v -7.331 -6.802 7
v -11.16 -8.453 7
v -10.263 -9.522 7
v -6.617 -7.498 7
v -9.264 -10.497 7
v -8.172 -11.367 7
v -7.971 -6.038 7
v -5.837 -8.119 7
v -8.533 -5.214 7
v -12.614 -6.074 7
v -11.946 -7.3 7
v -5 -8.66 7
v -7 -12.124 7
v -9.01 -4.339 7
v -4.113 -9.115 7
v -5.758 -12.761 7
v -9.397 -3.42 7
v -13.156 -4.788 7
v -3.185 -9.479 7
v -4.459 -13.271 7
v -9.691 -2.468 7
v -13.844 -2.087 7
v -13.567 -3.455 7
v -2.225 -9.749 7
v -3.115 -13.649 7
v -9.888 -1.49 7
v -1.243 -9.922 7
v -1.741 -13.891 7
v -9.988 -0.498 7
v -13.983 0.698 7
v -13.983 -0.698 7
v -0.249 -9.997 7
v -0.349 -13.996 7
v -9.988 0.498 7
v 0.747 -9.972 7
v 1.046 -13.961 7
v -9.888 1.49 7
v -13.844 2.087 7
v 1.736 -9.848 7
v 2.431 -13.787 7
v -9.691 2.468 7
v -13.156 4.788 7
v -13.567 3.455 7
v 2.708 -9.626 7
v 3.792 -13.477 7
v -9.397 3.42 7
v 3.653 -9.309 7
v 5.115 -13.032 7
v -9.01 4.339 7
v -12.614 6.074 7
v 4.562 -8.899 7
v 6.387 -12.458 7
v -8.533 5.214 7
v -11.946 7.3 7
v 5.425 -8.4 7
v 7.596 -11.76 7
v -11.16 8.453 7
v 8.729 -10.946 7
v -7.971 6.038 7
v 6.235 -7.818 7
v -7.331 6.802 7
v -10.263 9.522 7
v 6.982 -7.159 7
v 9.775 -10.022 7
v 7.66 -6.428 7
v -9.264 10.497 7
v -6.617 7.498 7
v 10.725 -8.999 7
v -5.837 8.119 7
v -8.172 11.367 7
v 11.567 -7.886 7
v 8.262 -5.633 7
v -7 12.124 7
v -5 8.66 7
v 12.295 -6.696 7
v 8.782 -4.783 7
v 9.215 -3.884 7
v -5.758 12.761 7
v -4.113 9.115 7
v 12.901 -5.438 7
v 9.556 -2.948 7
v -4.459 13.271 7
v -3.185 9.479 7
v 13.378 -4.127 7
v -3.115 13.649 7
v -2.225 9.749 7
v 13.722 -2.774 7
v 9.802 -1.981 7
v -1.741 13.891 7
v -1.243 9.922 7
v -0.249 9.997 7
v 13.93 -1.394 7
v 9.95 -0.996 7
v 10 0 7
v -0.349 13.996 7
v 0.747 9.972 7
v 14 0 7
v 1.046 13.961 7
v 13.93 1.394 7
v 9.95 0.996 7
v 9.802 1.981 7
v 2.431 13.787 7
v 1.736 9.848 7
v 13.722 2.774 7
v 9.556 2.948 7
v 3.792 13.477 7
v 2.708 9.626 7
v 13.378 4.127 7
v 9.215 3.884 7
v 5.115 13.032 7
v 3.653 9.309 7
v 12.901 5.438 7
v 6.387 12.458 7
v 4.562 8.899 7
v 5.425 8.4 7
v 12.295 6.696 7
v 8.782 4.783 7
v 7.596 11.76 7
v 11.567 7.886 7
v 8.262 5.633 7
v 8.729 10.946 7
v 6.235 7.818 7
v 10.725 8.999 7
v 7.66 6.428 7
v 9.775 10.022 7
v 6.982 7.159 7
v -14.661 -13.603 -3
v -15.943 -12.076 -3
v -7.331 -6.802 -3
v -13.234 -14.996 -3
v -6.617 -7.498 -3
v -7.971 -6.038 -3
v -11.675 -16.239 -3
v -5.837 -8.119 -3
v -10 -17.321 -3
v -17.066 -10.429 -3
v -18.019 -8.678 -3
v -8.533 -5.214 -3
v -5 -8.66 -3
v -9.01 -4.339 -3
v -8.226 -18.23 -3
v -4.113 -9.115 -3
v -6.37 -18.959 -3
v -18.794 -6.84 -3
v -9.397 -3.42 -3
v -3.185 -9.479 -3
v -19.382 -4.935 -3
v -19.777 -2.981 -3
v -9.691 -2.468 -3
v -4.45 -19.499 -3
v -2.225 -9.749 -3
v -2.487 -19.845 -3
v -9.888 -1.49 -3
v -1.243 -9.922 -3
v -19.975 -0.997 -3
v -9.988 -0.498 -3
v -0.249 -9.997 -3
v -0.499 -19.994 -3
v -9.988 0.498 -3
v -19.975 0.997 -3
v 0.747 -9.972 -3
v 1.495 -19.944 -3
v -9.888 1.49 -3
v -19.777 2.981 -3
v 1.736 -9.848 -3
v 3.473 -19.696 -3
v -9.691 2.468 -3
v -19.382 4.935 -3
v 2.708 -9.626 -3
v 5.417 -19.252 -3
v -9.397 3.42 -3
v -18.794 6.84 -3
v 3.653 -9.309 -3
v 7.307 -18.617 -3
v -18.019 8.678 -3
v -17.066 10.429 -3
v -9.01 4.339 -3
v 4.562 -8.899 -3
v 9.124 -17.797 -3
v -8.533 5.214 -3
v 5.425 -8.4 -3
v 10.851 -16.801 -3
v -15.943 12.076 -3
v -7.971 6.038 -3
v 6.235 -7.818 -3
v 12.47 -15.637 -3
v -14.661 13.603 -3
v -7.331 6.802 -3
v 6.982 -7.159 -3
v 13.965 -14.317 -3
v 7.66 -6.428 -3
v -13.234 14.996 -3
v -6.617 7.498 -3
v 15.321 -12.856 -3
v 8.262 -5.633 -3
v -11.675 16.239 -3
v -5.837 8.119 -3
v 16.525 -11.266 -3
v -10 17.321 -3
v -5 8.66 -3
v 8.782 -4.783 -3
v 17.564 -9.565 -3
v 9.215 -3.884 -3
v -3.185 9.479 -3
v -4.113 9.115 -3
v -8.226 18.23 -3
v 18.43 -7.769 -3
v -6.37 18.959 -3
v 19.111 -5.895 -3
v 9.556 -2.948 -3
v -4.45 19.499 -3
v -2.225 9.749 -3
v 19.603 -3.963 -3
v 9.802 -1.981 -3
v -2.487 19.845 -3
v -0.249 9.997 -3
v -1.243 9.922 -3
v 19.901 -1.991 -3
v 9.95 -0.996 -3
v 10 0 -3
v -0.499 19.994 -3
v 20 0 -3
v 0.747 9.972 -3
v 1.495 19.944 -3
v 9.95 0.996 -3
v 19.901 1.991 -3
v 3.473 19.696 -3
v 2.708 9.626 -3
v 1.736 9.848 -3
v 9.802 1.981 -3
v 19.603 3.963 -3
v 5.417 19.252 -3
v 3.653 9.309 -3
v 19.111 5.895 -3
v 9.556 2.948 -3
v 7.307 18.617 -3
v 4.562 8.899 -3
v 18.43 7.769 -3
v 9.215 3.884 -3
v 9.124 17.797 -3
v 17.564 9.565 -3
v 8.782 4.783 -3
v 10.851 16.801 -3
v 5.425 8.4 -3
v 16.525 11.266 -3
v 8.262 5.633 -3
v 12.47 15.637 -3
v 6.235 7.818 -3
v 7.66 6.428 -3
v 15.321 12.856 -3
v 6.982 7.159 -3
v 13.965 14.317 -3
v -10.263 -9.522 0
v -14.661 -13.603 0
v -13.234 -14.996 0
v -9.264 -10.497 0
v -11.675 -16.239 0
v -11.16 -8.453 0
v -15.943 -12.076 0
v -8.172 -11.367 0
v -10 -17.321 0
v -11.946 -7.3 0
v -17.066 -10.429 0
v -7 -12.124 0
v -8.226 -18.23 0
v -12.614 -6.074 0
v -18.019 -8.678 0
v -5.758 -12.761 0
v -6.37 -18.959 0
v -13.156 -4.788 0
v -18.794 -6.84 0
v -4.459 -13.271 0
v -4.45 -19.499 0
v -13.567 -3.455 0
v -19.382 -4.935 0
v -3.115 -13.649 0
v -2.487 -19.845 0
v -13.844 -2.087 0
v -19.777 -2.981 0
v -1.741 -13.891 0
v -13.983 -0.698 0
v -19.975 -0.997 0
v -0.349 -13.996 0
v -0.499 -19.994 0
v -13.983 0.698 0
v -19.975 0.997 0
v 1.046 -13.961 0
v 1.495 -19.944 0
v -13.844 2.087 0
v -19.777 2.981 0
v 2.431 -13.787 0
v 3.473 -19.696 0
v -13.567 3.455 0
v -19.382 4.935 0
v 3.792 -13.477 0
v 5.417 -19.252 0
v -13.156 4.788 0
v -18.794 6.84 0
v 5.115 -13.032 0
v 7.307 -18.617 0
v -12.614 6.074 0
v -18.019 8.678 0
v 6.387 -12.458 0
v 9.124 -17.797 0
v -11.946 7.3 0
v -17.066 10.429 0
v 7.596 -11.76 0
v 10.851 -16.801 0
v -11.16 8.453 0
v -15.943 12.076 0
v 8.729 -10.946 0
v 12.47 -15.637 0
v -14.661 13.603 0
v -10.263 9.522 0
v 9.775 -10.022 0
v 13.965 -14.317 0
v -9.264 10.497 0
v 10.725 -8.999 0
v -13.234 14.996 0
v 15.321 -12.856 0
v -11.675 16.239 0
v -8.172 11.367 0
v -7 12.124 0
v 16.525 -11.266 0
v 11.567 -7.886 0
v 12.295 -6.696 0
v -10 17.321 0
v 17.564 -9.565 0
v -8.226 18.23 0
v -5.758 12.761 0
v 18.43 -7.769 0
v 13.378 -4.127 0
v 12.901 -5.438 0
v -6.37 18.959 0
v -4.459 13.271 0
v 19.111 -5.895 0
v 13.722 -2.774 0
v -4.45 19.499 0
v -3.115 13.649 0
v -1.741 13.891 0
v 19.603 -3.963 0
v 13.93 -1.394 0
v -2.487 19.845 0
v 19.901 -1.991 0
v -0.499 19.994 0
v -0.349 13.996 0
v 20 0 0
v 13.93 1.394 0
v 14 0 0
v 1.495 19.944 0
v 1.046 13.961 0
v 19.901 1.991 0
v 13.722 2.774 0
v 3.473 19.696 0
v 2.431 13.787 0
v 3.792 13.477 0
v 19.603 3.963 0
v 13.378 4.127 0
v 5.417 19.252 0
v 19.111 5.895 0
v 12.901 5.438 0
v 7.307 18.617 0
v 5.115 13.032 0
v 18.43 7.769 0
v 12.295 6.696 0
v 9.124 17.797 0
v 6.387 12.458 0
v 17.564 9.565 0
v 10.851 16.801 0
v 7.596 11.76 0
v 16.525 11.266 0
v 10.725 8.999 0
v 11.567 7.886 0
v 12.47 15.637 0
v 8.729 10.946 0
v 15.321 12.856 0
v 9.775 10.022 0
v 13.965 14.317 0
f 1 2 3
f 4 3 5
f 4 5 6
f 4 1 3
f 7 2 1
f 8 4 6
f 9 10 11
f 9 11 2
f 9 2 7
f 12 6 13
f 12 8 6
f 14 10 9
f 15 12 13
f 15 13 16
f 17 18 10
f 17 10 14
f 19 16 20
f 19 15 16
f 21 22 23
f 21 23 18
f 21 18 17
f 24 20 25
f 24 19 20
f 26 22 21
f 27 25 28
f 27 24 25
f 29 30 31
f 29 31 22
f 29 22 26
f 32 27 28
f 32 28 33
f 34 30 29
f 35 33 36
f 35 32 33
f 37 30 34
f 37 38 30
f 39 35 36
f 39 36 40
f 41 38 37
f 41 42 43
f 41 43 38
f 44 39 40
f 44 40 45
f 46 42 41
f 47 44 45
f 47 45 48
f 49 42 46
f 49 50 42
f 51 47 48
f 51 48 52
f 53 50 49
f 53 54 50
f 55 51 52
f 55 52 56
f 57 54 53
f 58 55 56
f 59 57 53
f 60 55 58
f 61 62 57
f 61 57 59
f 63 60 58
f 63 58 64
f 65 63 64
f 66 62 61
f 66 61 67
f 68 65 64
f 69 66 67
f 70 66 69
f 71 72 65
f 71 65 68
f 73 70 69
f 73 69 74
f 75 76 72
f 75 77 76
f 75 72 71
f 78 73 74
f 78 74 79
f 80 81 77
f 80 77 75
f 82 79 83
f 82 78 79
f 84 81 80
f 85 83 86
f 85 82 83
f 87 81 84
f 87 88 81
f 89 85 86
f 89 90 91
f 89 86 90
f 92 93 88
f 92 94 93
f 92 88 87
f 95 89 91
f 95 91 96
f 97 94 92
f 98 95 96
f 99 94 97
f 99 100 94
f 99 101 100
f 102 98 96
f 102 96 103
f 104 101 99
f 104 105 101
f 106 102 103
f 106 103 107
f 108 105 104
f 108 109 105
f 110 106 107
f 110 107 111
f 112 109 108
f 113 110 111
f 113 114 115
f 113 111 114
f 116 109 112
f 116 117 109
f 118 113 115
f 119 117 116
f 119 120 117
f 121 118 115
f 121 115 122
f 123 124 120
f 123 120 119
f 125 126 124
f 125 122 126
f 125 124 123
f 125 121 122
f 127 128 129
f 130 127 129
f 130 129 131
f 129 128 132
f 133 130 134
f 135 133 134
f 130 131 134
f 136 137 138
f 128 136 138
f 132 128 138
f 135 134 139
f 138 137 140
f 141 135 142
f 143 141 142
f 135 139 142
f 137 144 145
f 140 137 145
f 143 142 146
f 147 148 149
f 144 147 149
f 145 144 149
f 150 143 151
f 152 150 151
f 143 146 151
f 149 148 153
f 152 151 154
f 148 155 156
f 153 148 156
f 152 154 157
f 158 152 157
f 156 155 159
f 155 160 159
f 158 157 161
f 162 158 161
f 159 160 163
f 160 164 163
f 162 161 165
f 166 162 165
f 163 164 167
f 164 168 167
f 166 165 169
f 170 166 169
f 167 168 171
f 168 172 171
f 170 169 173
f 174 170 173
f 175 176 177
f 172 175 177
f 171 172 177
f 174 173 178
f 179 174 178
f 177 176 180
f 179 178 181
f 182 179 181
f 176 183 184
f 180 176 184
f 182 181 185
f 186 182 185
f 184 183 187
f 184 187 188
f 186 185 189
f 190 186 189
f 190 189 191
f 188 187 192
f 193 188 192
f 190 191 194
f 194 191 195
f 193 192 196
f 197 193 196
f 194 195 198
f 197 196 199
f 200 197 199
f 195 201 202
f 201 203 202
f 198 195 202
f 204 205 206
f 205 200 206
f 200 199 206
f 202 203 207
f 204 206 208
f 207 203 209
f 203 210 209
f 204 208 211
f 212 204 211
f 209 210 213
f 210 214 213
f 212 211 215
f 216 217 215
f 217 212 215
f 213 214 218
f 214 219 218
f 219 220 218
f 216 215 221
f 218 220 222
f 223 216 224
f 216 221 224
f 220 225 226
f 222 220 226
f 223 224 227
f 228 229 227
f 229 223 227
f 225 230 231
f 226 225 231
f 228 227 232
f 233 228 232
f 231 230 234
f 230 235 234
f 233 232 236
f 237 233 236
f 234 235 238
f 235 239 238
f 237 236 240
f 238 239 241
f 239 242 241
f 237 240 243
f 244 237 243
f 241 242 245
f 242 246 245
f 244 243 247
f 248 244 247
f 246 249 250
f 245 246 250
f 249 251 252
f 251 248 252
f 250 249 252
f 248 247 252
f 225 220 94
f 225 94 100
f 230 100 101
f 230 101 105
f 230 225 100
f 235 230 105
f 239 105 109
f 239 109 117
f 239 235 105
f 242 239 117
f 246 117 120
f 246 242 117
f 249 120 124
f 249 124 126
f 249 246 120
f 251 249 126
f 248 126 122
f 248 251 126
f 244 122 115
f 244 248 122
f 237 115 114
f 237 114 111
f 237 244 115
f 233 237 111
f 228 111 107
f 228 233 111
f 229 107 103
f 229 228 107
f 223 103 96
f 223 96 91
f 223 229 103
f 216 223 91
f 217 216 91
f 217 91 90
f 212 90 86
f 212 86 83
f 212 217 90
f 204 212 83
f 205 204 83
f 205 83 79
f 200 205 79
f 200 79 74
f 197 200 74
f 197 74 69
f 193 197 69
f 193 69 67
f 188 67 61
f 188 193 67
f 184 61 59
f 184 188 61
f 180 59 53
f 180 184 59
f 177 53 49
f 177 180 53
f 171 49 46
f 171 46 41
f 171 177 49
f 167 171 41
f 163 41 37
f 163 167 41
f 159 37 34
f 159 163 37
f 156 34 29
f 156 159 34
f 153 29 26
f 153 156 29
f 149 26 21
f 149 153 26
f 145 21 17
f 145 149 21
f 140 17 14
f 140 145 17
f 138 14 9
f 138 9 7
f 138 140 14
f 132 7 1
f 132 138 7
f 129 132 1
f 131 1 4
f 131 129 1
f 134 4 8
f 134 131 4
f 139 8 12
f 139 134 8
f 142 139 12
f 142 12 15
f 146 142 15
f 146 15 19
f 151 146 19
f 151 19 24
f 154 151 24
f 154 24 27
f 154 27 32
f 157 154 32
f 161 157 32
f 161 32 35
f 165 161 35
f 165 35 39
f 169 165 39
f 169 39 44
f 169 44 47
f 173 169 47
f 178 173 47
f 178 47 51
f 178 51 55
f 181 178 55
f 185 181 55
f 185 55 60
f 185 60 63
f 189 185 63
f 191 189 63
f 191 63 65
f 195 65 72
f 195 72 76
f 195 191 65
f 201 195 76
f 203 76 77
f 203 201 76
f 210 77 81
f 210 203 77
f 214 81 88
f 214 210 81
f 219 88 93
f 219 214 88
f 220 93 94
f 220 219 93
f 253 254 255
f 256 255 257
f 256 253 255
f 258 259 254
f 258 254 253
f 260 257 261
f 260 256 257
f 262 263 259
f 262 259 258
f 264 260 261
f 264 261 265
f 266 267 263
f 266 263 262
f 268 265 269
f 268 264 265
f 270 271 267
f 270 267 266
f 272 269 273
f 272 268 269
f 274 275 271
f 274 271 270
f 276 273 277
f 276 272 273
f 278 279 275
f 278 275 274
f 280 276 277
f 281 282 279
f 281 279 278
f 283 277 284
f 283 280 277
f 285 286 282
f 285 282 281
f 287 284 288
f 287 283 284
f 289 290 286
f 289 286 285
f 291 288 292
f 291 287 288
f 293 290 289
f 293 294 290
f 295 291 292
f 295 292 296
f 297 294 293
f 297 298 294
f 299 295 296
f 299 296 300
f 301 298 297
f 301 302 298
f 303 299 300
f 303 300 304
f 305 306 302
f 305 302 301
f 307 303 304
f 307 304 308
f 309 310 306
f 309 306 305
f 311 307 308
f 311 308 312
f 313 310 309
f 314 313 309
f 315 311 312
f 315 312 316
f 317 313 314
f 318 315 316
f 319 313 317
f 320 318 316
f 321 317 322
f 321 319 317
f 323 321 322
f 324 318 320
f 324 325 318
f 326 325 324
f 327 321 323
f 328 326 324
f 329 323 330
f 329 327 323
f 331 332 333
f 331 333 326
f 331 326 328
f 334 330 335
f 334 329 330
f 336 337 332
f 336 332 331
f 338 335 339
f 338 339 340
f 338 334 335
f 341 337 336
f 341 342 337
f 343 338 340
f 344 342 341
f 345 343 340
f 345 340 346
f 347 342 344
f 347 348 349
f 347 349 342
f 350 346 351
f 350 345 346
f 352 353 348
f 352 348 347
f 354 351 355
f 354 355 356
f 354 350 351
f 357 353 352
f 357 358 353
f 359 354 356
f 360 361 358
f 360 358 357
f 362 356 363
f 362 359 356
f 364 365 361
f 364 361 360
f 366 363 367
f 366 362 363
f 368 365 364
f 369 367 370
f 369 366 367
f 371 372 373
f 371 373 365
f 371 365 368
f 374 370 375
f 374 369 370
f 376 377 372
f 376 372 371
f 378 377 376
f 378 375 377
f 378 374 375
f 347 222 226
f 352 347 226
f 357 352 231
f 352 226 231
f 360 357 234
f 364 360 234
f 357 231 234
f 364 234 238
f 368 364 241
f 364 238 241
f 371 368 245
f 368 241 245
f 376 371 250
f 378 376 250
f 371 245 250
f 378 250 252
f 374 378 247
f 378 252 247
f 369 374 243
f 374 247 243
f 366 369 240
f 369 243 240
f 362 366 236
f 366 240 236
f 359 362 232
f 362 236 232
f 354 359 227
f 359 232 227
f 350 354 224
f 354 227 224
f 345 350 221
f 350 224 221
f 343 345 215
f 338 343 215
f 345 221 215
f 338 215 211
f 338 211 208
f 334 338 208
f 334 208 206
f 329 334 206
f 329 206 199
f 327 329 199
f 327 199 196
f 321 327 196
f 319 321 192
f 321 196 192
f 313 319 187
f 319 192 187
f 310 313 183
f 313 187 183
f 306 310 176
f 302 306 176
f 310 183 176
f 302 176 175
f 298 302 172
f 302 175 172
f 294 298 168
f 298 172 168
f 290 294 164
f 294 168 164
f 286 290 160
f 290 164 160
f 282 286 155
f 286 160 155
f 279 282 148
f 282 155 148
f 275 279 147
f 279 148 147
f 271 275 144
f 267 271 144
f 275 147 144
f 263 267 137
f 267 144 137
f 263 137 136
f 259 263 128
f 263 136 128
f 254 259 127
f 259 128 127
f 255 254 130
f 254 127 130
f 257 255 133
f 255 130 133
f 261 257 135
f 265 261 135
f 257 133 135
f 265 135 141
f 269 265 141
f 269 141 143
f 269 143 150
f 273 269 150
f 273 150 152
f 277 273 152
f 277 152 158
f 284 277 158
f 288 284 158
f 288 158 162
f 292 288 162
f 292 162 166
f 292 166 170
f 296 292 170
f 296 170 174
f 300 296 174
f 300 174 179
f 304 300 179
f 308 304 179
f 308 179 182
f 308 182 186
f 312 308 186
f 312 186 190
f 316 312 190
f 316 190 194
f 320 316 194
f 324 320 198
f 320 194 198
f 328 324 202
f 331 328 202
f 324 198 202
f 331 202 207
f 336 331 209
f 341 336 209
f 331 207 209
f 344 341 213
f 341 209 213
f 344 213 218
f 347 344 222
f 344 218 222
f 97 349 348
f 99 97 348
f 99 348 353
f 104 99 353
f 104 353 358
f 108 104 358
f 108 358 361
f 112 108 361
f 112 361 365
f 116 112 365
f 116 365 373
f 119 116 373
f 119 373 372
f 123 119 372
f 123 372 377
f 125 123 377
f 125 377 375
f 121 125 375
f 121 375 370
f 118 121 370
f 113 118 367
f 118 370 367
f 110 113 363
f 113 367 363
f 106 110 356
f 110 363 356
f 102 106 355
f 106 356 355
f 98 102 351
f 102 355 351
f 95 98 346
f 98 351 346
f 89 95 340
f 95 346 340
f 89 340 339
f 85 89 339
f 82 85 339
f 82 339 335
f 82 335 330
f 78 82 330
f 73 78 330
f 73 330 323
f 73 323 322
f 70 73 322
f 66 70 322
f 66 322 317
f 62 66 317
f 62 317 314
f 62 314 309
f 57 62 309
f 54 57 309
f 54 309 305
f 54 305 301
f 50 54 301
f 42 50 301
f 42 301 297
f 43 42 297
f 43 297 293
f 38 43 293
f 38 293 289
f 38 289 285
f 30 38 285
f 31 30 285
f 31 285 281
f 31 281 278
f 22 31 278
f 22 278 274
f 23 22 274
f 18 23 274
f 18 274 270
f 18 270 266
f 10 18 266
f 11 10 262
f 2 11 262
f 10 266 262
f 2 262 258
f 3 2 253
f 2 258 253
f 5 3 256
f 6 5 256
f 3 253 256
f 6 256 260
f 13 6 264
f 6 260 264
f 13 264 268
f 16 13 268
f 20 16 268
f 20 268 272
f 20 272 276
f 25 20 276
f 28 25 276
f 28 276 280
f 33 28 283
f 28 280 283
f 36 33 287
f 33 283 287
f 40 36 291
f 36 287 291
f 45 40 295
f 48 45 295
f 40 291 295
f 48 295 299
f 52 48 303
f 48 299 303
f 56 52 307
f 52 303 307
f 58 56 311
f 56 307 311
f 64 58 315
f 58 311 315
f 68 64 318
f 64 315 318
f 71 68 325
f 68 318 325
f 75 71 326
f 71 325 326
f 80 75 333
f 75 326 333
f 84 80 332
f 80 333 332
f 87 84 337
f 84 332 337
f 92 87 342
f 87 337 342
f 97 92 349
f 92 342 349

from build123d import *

# Parameters (mm, degrees)
CYLINDER023_R     = 10
CYLINDER023_DEPTH = 10
CYLINDER022_R     = 14
CYLINDER022_DEPTH = 10
CYLINDER021_R     = 20
CYLINDER021_DEPTH = 3


with BuildPart() as cylinder007:
    # Cylinder023 → Cylinder023 (new body)
    with BuildSketch(Plane.XY):
        Circle(CYLINDER023_R)
    extrude(amount=CYLINDER023_DEPTH)


with BuildPart() as cylinder006:
    # Cylinder022 → Cylinder022 (new body)
    with BuildSketch(Plane.XY):
        Circle(CYLINDER022_R)
    extrude(amount=CYLINDER022_DEPTH)


with BuildPart() as cut032:
    # Cylinder021 → Cylinder021 (new body)
    with BuildSketch(Plane.XY):
        Circle(CYLINDER021_R)
    extrude(amount=CYLINDER021_DEPTH)

    # Fusion025: union Cylinder006
    add(cylinder006.part)

    # Cut032: cut Cylinder007
    add(cylinder007.part, mode=Mode.SUBTRACT)


with BuildPart() as cut032_1:
    # Cut032 placement: moved
    add(cut032.part.moved(Location((0, 0, -3))))


solid = cut032_1.part
